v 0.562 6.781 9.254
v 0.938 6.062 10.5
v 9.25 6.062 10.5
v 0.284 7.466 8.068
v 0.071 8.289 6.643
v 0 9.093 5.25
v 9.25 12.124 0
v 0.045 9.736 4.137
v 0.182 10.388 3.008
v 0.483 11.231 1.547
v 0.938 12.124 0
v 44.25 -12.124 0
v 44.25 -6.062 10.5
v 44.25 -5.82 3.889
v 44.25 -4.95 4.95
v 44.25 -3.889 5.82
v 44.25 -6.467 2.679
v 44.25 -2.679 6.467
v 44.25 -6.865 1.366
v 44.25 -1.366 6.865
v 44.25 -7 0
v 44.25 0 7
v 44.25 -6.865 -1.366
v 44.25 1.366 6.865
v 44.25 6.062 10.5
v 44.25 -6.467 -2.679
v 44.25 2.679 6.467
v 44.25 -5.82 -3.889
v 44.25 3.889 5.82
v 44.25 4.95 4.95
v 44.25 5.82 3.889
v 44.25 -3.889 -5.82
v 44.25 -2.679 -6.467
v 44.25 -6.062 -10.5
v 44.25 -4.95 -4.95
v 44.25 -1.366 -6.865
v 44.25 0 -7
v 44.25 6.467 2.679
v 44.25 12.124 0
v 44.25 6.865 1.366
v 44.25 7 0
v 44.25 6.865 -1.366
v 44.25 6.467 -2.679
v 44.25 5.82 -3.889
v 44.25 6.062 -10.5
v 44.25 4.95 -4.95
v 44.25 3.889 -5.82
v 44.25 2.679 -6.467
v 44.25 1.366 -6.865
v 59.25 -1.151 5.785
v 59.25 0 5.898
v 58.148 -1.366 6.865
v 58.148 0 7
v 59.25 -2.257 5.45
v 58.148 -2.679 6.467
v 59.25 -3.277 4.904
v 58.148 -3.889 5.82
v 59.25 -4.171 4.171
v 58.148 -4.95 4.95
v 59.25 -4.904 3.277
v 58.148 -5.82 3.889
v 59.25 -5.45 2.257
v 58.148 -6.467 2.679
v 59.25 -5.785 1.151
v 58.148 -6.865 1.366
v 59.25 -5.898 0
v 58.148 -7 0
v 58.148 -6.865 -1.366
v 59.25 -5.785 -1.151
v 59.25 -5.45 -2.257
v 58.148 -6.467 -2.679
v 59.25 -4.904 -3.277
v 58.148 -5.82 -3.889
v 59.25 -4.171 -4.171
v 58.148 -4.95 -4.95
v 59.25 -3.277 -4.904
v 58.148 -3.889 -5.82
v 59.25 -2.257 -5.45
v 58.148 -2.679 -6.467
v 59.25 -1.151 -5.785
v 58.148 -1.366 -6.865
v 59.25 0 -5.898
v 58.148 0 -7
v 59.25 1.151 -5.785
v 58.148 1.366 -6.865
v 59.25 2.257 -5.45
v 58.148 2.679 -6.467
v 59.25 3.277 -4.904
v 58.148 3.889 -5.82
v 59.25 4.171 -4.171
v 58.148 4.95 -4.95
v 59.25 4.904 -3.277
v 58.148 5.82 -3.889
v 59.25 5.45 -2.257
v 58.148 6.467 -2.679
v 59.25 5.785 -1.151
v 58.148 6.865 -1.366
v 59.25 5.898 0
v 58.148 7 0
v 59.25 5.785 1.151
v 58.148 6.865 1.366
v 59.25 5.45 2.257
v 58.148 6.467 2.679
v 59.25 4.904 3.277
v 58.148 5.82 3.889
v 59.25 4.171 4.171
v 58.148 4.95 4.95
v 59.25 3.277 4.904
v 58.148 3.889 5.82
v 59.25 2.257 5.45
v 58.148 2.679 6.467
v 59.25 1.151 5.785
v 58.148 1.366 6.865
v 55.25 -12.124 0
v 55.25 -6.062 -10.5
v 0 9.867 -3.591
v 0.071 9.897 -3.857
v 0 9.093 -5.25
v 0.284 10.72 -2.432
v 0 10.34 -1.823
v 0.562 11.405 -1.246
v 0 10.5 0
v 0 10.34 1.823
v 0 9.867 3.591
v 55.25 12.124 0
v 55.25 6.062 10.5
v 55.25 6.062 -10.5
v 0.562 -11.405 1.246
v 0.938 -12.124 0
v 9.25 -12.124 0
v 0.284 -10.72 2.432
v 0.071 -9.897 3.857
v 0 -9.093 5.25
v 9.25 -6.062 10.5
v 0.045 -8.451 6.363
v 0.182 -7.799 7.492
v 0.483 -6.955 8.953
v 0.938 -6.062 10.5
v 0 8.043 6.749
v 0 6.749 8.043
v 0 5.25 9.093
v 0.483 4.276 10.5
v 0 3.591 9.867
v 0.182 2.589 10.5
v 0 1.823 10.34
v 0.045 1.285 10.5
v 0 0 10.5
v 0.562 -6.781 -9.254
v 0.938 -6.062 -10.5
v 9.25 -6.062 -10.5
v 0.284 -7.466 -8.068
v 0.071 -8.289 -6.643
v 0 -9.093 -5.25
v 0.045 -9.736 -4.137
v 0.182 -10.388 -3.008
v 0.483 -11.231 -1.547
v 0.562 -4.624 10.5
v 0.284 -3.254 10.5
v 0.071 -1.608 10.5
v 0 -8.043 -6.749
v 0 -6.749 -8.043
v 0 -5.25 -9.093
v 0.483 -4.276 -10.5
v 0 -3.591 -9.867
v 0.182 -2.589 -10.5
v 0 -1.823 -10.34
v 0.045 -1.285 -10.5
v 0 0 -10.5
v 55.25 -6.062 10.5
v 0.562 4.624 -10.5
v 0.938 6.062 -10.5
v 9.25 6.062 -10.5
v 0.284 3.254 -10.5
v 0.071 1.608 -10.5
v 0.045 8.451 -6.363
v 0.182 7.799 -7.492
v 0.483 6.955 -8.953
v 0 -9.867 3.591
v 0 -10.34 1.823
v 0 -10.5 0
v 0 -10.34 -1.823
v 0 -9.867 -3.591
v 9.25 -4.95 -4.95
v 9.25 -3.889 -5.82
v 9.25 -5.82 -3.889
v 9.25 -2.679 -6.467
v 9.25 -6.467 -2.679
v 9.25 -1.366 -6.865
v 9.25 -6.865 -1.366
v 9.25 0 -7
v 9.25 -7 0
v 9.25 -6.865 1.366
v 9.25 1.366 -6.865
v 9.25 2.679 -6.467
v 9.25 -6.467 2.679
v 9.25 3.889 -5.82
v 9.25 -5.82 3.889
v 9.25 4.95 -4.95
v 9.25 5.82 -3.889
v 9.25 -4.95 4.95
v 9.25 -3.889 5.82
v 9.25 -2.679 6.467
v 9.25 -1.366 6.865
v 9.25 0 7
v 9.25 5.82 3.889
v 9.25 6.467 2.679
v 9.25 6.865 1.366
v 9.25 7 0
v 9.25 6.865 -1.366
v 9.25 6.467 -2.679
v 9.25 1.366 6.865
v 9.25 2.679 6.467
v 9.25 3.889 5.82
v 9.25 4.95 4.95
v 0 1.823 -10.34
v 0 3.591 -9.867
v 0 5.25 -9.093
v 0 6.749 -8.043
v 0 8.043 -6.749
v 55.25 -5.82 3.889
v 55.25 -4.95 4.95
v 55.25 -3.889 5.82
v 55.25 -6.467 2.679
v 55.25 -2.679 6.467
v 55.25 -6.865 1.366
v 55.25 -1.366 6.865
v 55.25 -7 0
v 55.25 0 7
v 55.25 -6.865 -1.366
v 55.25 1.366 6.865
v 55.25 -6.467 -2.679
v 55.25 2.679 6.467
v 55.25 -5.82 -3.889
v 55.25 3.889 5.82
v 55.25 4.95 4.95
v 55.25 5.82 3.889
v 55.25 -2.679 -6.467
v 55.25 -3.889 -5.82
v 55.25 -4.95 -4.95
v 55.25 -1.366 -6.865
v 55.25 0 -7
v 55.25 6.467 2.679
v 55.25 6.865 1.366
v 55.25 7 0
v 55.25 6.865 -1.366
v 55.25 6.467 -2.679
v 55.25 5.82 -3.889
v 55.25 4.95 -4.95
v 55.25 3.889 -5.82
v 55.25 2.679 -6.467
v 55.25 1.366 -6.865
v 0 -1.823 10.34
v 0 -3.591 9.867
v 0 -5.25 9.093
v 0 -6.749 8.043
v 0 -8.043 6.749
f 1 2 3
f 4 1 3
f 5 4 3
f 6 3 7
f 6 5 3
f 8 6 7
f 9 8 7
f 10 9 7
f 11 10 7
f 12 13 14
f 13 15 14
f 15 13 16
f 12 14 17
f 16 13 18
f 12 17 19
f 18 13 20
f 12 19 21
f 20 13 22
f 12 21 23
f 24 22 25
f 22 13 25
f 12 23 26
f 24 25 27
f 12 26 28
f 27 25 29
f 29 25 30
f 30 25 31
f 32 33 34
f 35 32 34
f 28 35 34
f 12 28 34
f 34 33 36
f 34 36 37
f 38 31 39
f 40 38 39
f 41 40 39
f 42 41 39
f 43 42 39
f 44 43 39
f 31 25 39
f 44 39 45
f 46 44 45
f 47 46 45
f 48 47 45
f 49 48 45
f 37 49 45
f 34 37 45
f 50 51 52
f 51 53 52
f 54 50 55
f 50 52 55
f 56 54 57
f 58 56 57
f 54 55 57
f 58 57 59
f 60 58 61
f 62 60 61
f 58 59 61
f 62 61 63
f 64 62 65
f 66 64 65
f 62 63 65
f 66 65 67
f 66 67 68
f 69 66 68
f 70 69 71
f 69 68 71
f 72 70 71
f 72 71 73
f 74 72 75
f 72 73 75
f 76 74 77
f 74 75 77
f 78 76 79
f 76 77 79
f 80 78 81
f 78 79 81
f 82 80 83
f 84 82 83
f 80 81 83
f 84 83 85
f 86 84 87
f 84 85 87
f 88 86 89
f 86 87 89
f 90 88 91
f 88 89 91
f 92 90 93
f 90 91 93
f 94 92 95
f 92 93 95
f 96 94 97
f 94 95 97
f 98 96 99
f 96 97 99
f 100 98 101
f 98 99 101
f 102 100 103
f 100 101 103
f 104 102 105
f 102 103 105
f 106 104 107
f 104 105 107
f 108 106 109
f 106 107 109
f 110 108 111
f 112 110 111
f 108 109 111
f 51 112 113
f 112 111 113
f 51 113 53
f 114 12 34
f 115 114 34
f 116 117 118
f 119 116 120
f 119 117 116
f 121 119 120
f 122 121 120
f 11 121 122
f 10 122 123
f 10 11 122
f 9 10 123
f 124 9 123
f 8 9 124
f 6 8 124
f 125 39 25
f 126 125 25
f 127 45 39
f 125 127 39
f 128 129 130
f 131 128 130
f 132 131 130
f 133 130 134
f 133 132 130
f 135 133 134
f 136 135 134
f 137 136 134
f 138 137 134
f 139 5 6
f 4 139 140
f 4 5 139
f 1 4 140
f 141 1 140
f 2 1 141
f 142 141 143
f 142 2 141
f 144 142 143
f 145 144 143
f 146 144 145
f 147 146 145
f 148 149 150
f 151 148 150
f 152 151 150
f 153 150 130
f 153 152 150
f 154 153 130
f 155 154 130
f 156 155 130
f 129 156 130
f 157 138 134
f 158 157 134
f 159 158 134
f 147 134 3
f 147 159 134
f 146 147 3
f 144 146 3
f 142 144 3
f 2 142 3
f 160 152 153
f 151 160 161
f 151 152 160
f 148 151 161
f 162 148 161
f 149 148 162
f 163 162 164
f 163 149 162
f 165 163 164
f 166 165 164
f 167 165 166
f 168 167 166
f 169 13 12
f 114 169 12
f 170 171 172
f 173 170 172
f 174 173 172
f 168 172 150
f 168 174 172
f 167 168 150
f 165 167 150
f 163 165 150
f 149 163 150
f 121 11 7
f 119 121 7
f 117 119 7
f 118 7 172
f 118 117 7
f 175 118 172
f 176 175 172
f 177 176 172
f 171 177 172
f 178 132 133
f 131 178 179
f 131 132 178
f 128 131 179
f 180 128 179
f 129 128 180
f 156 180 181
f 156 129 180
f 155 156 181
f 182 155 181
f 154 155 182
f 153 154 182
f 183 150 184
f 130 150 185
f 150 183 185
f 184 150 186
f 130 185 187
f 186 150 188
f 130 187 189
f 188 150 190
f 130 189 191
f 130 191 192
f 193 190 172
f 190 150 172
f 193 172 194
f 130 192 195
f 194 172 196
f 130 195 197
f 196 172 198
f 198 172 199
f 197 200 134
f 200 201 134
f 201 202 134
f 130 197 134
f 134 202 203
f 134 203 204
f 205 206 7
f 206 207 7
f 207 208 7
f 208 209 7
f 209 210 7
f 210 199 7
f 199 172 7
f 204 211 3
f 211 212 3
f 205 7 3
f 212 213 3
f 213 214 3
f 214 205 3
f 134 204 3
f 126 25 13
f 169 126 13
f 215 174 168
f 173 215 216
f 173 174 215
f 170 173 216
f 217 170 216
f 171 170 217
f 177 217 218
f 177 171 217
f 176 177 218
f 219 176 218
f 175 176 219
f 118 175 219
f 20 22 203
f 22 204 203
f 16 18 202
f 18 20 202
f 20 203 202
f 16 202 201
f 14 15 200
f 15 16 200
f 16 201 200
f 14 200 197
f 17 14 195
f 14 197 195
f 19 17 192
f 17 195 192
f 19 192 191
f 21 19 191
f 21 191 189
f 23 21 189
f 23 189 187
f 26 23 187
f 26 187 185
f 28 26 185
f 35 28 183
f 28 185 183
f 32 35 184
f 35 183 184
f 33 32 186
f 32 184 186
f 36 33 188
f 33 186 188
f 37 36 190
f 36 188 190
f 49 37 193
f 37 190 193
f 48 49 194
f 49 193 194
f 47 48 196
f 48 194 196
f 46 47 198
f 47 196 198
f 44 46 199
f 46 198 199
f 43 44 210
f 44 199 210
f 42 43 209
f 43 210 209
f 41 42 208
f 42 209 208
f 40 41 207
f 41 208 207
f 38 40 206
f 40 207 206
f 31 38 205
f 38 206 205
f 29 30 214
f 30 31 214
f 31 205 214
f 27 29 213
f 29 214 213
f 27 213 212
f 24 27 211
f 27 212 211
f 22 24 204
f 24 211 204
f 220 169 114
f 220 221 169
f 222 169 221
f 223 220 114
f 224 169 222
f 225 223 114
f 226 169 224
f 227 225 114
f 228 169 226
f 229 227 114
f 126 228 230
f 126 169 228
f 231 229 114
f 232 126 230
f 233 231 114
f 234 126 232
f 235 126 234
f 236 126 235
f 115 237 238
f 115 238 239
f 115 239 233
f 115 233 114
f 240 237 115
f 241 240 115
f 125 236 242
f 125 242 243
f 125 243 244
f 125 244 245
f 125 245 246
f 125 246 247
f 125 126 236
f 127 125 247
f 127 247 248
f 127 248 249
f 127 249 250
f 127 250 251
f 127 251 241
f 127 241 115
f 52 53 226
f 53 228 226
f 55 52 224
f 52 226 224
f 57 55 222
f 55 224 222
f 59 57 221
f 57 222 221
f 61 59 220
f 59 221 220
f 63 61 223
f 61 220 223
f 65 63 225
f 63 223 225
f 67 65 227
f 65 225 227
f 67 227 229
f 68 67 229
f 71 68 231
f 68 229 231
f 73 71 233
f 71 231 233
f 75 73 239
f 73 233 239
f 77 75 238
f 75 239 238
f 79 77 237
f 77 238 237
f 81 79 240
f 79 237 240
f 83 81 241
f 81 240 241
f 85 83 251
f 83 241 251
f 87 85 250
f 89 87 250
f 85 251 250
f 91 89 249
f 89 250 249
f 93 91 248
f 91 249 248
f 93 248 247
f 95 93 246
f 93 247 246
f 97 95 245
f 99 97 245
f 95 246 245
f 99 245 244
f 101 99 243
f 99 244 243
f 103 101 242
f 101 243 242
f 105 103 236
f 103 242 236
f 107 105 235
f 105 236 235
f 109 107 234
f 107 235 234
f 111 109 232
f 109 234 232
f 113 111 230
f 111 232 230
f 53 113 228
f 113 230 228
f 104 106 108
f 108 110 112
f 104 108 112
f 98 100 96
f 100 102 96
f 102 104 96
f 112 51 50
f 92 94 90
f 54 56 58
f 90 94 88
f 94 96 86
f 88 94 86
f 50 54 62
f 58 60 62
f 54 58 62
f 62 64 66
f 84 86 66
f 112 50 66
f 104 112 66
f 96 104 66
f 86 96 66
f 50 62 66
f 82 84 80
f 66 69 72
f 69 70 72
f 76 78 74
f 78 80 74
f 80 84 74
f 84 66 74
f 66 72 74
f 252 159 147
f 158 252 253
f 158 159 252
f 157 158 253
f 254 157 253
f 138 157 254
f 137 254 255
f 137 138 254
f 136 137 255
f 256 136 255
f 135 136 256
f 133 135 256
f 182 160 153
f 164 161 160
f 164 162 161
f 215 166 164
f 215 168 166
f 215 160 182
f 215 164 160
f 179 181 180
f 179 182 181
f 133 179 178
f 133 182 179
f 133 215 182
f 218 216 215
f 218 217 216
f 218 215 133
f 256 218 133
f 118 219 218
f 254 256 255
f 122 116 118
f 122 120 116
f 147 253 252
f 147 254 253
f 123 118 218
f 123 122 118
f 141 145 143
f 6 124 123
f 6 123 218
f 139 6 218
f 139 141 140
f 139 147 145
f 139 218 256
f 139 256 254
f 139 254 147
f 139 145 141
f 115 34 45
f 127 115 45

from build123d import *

# Parameters (mm, degrees)
BASEHEAD_DEPTH      = 9.25
BOSS_EXTRUDE1_DEPTH = 11


with BuildPart() as part:
    # Sketch1 → BaseHead (new body)
    with BuildSketch(Plane(origin=(0, 0, 0), x_dir=(0, 0, -1), z_dir=(1, 0, 0))):
        Polygon((10.5, 6.062177826), (10.5, -6.062177826), (0, -12.124355653), (-10.5, -6.062177826), (-10.5, 6.062177826), (0, 12.124355653), align=None)
    extrude(amount=BASEHEAD_DEPTH)

    # BodySke → BaseBody (revolve)
    with BuildSketch(Plane.XY, mode=Mode.PRIVATE) as basebody_sk:
        Polygon((0, 0), (59.25, 0), (59.25, 5.8985), (58.1485, 7), (0, 7), align=None)
    revolve(basebody_sk.sketch.rotate(Axis((0, 0, 0), (1, 0, 0)), 90), axis=Axis((0, 0, 0), (1, 0, 0)))

    # Sketch3 → HeadChamfer (revolve, cut)
    with BuildSketch(Plane.XY):
        Polygon((0, 10.5), (3.824573519, 17.124355653), (3.824573519, 22.124355653), (-10, 22.124355653), (-10, 10.5), align=None)
    revolve(axis=Axis((0, 0, 0), (1, 0, 0)), mode=Mode.SUBTRACT)

    # Sketch4 → Boss-Extrude1 (add)
    with BuildSketch(Plane(origin=(44.25, 0, 0), x_dir=(0, 0, -1), z_dir=(1, 0, 0))):
        Polygon((0, 12.124355653), (-10.5, 6.062177826), (-10.5, -6.062177826), (0, -12.124355653), (10.5, -6.062177826), (10.5, 6.062177826), align=None)
    extrude(amount=BOSS_EXTRUDE1_DEPTH)


solid = part.part
